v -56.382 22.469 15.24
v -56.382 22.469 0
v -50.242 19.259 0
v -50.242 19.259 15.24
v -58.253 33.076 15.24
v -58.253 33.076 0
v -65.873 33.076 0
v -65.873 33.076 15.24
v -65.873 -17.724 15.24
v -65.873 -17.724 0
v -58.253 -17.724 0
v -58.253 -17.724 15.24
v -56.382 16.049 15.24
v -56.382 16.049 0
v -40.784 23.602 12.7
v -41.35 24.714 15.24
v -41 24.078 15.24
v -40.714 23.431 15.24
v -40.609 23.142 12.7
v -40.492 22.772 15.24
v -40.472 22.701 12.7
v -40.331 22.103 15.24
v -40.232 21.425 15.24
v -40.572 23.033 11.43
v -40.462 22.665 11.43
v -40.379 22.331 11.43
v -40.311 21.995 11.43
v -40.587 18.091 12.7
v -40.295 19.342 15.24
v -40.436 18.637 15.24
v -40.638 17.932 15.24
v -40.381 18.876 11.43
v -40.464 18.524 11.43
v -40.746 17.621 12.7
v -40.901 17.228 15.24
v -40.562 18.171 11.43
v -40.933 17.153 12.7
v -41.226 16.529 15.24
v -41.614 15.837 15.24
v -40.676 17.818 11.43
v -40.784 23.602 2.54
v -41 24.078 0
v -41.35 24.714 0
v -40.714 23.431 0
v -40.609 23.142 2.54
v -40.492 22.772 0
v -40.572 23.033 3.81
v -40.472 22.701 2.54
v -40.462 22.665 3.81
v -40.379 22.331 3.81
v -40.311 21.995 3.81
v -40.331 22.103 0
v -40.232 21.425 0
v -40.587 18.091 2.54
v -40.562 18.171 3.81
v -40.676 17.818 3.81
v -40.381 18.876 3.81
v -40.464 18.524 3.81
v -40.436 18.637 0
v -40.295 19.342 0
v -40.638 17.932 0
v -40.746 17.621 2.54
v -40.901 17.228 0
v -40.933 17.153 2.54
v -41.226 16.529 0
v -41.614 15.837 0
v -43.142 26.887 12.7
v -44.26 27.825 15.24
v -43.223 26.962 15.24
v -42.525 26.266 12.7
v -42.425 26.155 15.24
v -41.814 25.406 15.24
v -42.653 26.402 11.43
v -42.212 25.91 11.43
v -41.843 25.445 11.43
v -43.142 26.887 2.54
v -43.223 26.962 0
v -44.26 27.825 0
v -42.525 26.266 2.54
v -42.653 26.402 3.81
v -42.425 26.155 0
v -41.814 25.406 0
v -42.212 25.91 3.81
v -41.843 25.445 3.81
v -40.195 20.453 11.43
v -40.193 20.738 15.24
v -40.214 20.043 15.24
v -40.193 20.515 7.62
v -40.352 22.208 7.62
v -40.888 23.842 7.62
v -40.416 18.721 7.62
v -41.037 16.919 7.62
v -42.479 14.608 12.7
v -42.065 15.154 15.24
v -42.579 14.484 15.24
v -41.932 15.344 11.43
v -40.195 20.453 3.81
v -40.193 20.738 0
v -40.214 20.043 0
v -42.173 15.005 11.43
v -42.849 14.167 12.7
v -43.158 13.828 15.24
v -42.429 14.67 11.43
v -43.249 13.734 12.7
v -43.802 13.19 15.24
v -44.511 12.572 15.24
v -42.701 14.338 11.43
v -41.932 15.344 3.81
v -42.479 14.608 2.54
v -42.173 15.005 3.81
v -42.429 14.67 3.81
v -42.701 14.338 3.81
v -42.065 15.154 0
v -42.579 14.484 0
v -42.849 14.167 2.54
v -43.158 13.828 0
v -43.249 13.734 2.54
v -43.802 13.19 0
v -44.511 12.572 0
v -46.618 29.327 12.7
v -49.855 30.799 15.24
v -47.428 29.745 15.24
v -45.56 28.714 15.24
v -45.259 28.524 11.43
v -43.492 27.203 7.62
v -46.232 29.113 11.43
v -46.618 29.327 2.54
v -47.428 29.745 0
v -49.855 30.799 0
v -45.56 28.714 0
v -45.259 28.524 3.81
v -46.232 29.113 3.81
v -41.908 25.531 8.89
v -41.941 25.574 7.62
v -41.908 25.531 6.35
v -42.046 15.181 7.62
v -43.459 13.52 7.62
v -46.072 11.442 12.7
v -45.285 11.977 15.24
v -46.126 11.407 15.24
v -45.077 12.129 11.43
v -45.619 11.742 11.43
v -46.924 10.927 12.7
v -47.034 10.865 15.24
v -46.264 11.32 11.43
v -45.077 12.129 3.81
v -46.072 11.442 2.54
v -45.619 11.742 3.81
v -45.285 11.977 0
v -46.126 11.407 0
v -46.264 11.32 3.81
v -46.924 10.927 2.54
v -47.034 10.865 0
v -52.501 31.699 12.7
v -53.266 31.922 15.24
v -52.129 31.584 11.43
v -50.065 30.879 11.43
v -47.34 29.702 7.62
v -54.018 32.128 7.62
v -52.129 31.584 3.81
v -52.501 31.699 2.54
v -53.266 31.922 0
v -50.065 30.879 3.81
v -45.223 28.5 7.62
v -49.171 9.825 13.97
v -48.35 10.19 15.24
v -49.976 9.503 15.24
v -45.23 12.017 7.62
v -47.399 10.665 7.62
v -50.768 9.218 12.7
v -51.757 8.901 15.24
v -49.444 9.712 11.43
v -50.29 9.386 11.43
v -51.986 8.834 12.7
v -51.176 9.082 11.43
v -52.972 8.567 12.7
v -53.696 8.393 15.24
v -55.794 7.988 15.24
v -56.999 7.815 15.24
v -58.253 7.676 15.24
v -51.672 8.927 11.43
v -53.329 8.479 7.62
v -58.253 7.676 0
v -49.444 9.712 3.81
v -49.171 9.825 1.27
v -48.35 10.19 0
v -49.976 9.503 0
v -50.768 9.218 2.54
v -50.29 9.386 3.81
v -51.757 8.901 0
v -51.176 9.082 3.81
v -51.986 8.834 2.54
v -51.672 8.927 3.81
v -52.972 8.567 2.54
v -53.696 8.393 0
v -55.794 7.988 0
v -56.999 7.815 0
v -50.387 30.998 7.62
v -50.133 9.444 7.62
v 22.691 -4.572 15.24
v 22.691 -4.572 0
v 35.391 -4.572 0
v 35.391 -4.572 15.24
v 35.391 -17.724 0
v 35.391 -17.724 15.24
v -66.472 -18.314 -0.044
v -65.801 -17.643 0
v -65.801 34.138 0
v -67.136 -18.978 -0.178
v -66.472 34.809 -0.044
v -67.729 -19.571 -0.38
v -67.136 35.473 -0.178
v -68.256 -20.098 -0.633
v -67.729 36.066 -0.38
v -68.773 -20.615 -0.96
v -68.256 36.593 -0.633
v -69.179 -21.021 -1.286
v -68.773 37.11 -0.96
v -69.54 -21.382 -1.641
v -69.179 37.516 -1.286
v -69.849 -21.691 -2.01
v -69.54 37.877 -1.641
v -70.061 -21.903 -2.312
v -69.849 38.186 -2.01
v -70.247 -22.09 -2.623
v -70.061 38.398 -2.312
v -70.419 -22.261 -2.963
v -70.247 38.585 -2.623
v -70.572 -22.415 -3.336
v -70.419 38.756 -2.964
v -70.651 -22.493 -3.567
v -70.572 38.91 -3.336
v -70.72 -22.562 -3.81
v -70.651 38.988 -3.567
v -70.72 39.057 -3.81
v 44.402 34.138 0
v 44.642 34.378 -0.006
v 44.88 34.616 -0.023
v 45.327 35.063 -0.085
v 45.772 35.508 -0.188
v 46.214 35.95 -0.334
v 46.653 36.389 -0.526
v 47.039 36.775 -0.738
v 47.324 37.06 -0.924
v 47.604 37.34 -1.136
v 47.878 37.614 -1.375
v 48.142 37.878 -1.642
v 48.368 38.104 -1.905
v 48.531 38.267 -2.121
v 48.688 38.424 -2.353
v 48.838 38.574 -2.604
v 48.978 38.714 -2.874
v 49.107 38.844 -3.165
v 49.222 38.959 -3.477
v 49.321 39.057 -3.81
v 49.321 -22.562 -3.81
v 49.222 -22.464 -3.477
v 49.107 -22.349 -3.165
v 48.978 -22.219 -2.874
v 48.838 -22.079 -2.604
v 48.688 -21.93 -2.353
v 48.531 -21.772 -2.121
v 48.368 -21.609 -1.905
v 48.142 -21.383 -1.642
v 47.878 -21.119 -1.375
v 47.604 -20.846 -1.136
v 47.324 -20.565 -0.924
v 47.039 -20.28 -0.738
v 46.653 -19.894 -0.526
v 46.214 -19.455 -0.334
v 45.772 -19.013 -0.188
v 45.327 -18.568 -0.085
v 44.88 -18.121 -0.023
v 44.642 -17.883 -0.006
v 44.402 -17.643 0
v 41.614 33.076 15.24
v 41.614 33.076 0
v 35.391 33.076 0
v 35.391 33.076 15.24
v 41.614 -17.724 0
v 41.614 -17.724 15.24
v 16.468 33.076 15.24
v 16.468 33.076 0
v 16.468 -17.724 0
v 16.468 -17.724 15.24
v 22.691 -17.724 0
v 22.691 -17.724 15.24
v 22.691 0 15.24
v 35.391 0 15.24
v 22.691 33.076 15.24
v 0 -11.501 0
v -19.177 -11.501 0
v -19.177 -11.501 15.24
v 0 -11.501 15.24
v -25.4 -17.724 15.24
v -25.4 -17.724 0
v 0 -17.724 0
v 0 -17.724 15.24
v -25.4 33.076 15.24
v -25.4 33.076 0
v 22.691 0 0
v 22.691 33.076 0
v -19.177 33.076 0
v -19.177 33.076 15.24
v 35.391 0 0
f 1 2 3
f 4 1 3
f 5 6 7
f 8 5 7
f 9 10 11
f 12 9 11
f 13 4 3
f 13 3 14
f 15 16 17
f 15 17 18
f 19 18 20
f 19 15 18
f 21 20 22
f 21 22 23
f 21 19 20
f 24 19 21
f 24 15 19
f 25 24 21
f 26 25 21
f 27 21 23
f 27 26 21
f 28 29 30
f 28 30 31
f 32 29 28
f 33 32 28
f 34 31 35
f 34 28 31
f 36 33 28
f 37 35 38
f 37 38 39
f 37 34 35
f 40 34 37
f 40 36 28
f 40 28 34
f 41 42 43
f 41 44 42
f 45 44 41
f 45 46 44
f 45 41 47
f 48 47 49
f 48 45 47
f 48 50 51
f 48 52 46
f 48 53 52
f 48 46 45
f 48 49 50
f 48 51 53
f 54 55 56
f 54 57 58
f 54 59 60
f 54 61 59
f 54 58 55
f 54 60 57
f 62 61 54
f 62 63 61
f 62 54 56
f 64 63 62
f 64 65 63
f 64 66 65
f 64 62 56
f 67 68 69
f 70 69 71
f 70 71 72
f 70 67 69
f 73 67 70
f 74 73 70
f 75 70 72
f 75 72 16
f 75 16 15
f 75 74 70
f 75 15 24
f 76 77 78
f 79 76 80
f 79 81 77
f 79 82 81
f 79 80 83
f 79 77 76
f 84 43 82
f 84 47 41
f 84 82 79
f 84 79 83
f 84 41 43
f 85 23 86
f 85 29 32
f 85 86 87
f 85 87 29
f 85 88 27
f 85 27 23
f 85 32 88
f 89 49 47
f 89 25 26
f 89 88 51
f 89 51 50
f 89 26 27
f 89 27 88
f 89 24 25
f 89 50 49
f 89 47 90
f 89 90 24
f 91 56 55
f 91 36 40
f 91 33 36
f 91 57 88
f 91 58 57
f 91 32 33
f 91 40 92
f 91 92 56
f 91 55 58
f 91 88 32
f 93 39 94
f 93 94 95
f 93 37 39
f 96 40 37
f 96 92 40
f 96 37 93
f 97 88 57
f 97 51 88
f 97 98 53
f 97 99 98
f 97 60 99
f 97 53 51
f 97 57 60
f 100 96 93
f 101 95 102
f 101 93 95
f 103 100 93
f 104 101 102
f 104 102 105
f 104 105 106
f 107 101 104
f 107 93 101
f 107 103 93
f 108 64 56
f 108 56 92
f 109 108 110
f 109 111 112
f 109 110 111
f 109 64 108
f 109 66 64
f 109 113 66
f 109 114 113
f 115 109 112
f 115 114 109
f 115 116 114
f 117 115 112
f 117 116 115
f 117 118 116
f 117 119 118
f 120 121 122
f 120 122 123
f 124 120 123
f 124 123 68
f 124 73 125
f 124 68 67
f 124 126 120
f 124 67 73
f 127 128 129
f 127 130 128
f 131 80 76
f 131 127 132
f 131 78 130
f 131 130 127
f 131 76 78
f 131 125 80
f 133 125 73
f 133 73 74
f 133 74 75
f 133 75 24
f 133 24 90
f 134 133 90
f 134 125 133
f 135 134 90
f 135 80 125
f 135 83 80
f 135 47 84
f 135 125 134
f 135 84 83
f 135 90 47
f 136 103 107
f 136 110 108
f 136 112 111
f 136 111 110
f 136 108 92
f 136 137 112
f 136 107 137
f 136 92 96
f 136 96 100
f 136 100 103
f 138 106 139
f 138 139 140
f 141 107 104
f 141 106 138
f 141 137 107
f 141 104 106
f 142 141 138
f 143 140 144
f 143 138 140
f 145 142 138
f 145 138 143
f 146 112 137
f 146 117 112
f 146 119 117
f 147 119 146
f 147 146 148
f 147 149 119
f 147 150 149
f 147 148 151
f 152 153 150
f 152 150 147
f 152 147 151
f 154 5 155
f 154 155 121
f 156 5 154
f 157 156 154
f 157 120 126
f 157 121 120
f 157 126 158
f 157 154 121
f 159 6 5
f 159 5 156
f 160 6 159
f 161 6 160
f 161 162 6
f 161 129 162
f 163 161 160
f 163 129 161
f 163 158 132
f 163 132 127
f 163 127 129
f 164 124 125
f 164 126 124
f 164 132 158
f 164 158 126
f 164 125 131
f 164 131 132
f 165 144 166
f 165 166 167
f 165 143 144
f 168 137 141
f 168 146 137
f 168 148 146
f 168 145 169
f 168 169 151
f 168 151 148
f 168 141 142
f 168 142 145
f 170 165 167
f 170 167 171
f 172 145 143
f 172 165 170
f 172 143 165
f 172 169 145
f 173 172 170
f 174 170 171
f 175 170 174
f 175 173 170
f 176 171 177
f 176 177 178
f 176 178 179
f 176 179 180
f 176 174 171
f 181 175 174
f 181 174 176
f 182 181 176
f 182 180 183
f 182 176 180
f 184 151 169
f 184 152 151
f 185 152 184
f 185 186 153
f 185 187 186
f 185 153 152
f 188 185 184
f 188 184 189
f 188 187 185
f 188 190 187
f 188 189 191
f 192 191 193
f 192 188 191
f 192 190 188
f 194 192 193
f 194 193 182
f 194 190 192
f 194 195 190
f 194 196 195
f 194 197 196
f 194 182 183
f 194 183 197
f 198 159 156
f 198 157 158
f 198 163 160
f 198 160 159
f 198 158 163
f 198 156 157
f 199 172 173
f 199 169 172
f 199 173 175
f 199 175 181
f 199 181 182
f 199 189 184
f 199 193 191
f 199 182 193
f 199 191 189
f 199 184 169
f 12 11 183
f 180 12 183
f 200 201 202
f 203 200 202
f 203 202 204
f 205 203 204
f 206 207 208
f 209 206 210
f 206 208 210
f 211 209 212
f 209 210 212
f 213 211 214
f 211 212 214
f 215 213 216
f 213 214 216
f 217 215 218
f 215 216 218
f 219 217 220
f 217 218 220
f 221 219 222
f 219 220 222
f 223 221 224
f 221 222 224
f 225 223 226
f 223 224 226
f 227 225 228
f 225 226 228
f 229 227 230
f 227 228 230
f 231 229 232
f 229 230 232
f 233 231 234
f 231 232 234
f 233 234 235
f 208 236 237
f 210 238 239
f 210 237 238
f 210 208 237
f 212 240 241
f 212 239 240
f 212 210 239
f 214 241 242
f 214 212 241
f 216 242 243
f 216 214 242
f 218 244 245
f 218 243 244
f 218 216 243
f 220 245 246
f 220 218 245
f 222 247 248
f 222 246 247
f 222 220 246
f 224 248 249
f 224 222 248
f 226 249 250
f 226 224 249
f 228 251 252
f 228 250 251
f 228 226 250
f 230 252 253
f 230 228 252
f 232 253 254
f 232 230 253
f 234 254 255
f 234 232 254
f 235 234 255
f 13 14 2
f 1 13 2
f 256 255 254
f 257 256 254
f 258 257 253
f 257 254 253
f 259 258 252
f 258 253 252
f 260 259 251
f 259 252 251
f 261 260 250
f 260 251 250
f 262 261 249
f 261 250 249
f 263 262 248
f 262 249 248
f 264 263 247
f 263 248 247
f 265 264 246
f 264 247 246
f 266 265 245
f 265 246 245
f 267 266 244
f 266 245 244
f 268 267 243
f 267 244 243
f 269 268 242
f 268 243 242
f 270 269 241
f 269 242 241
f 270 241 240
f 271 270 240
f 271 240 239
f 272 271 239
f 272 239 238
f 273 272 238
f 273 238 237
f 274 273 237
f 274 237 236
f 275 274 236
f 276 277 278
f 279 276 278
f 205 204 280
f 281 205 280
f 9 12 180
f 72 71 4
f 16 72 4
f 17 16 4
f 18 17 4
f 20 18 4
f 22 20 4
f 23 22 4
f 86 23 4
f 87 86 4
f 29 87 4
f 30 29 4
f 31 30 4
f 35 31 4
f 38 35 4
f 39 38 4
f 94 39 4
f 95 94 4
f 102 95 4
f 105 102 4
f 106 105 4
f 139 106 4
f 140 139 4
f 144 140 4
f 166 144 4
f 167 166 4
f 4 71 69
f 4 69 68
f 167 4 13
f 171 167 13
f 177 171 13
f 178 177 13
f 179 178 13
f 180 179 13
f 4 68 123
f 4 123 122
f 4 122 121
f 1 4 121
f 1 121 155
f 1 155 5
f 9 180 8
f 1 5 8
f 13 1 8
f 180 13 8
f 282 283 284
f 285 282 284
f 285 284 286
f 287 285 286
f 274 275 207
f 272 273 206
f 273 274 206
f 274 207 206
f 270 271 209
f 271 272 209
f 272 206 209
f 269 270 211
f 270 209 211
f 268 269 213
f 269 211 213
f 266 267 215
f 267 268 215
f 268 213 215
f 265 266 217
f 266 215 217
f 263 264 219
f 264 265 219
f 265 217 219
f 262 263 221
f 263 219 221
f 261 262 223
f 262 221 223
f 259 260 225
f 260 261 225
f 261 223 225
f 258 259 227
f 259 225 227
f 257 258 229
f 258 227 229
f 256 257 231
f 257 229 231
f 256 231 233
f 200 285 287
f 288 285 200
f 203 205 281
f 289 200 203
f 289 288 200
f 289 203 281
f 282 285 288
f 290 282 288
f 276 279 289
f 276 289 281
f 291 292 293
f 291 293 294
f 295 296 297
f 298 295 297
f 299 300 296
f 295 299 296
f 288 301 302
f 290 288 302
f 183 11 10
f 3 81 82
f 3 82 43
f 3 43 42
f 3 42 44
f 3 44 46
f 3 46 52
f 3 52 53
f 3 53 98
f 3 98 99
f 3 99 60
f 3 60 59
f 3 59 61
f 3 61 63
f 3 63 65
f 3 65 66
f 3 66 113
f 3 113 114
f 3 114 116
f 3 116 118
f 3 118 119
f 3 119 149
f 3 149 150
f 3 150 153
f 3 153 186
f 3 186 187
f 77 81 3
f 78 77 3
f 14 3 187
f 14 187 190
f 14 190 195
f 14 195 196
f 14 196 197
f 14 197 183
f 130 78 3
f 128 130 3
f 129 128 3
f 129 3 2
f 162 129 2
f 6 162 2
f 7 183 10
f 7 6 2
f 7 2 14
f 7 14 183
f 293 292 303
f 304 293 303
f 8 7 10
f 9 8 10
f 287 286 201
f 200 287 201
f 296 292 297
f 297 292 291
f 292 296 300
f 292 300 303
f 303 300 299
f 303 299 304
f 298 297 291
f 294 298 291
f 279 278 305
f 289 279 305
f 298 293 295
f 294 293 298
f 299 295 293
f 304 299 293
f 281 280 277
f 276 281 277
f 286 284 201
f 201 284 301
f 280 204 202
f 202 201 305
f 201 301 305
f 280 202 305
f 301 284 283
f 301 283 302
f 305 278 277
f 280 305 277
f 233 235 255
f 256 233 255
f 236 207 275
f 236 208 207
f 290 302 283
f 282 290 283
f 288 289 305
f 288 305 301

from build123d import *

# Parameters (mm, degrees)
F1_DEPTH    = 15.24
F2_DEPTH    = 15.24
F0_W        = 6.223
F0_H        = 44.577
F0_H_2      = 6.223
F0_W_2      = 19.177
F4_DEPTH    = 3.81
F5_T1_DEPTH = 144.6338988167
F5_T3_DEPTH = 86.212517401


# Not quite as in the source:
# - a fillet or chamfer that OpenCascade refuses, or shapes differently, is made with other operations: its cross-section is extruded or revolved along the edge and cut away or added


with BuildPart() as f1:
    # F0 (on Top) → F1 (new body)
    with BuildSketch(Plane.XY):
        with BuildLine():
            add(Edge.make_bspline(
                [(-58.2525283742, 33.0758240239), (-45.5206043265, 30.688588265), (-34.6846427624, 21.2199367045), (-45.8849792124, 8.8536855352), (-58.2525283742, 7.6758240239)],
                knots=[0, 0, 0, 0, 0.4990909505, 1, 1, 1, 1], degree=3))
            Line((-58.2525283742, 33.0758240239), (-65.8725283742, 33.0758240239))
            Line((-65.8725283742, 33.0758240239), (-65.8725283742, -17.7241759761))
            Line((-65.8725283742, -17.7241759761), (-58.2525283742, -17.7241759761))
            Line((-58.2525283742, -17.7241759761), (-58.2525283742, 7.6758240239))
        make_face()
        Polygon((-56.3824130938, 16.0494490157), (-56.3824130938, 22.4692318326), (-50.2417553016, 19.2593404241), align=None, mode=Mode.SUBTRACT)
    extrude(amount=F1_DEPTH)

    # F0 (on Top) → F2 (join)
    with BuildSketch(Plane.XY):
        with BuildLine():
            add(Edge.make_bspline(
                [(-58.2525283742, 33.0758240239), (-45.5206043265, 30.688588265), (-34.6846427624, 21.2199367045), (-45.8849792124, 8.8536855352), (-58.2525283742, 7.6758240239)],
                knots=[0, 0, 0, 0, 0.4990909505, 1, 1, 1, 1], degree=3))
            Line((-58.2525283742, 33.0758240239), (-65.8725283742, 33.0758240239))
            Line((-65.8725283742, 33.0758240239), (-65.8725283742, -17.7241759761))
            Line((-65.8725283742, -17.7241759761), (-58.2525283742, -17.7241759761))
            Line((-58.2525283742, -17.7241759761), (-58.2525283742, 7.6758240239))
        make_face()
        Polygon((-56.3824130938, 16.0494490157), (-56.3824130938, 22.4692318326), (-50.2417553016, 19.2593404241), align=None, mode=Mode.SUBTRACT)
    extrude(amount=F2_DEPTH)


with BuildPart() as f2:
    # F0 (on Top) → F2, piece 2 (new body)
    with BuildSketch(Plane.XY):
        with Locations((-22.2885, 10.7873240239)):
            Rectangle(F0_W, F0_H)
        with Locations((-22.2885, -14.6126759761)):
            Rectangle(F0_W, F0_H_2)
        with Locations((-9.5885, -14.6126759761)):
            Rectangle(F0_W_2, F0_H_2)
    extrude(amount=F2_DEPTH)


with BuildPart() as f2b:
    # F0 (on Top) → F2, piece 3 (new body)
    with BuildSketch(Plane.XY):
        Polygon((22.6911320935, 33.0758240239), (16.4681320935, 33.0758240239), (16.4681320935, -17.7241759761), (22.6911320935, -17.7241759761), (22.6911320935, -4.572), (35.3911320935, -4.572), (35.3911320935, -17.7241759761), (41.6141320935, -17.7241759761), (41.6141320935, 33.0758240239), (35.3911320935, 33.0758240239), (35.3911320935, 0), (22.6911320935, 0), align=None)
    extrude(amount=F2_DEPTH)


with BuildPart() as f4:
    # F3 (on Top) → F4 (new body)
    with BuildSketch(Plane.XY):
        Polygon((49.3206983823, -17.523912622), (49.3206983823, 32.3124918177), (49.3206983823, 39.0570126474), (-70.719756186, 39.0570126474), (-70.719756186, -22.5620605052), (49.3206983823, -22.5620605052), align=None)
    extrude(amount=-F4_DEPTH)

    # F5: fillet of radius 5.08 on 4 edges, made by hand

    # F5_s2 → F5_t1 (cut)
    with BuildSketch(Plane.YZ.offset(-83.0164783102)):
        with BuildLine():
            ThreePointArc((-17.6433716555, 0), (-20.7542236288, -1.0639073716), (-22.5620605052, -3.81))
            Line((-22.5620605052, -3.81), (-22.5620605052, 0))
            Line((-22.5620605052, 0), (-17.6433716555, 0))
        make_face()
        with BuildLine():
            ThreePointArc((34.1383237977, 0), (37.249175771, -1.0639073716), (39.0570126474, -3.81))
            Line((39.0570126474, -3.81), (39.0570126474, 0))
            Line((39.0570126474, 0), (34.1383237977, 0))
        make_face()
    extrude(amount=F5_T1_DEPTH, mode=Mode.SUBTRACT)

    # F5_s4 → F5_t3 (cut)
    with BuildSketch(Plane.XZ.offset(-51.3537347716)):
        with BuildLine():
            ThreePointArc((-65.8010673363, 0), (-68.9119193097, -1.0639073716), (-70.719756186, -3.81))
            Line((-70.719756186, -3.81), (-70.719756186, 0))
            Line((-70.719756186, 0), (-65.8010673363, 0))
        make_face()
        with BuildLine():
            ThreePointArc((49.3206983823, -3.81), (47.512861506, -1.0639073716), (44.4020095326, 0))
            Line((44.4020095326, 0), (49.3206983823, 0))
            Line((49.3206983823, 0), (49.3206983823, -3.81))
        make_face()
    extrude(amount=F5_T3_DEPTH, mode=Mode.SUBTRACT)


solid = Compound([f1.part, f2.part, f2b.part, f4.part])
